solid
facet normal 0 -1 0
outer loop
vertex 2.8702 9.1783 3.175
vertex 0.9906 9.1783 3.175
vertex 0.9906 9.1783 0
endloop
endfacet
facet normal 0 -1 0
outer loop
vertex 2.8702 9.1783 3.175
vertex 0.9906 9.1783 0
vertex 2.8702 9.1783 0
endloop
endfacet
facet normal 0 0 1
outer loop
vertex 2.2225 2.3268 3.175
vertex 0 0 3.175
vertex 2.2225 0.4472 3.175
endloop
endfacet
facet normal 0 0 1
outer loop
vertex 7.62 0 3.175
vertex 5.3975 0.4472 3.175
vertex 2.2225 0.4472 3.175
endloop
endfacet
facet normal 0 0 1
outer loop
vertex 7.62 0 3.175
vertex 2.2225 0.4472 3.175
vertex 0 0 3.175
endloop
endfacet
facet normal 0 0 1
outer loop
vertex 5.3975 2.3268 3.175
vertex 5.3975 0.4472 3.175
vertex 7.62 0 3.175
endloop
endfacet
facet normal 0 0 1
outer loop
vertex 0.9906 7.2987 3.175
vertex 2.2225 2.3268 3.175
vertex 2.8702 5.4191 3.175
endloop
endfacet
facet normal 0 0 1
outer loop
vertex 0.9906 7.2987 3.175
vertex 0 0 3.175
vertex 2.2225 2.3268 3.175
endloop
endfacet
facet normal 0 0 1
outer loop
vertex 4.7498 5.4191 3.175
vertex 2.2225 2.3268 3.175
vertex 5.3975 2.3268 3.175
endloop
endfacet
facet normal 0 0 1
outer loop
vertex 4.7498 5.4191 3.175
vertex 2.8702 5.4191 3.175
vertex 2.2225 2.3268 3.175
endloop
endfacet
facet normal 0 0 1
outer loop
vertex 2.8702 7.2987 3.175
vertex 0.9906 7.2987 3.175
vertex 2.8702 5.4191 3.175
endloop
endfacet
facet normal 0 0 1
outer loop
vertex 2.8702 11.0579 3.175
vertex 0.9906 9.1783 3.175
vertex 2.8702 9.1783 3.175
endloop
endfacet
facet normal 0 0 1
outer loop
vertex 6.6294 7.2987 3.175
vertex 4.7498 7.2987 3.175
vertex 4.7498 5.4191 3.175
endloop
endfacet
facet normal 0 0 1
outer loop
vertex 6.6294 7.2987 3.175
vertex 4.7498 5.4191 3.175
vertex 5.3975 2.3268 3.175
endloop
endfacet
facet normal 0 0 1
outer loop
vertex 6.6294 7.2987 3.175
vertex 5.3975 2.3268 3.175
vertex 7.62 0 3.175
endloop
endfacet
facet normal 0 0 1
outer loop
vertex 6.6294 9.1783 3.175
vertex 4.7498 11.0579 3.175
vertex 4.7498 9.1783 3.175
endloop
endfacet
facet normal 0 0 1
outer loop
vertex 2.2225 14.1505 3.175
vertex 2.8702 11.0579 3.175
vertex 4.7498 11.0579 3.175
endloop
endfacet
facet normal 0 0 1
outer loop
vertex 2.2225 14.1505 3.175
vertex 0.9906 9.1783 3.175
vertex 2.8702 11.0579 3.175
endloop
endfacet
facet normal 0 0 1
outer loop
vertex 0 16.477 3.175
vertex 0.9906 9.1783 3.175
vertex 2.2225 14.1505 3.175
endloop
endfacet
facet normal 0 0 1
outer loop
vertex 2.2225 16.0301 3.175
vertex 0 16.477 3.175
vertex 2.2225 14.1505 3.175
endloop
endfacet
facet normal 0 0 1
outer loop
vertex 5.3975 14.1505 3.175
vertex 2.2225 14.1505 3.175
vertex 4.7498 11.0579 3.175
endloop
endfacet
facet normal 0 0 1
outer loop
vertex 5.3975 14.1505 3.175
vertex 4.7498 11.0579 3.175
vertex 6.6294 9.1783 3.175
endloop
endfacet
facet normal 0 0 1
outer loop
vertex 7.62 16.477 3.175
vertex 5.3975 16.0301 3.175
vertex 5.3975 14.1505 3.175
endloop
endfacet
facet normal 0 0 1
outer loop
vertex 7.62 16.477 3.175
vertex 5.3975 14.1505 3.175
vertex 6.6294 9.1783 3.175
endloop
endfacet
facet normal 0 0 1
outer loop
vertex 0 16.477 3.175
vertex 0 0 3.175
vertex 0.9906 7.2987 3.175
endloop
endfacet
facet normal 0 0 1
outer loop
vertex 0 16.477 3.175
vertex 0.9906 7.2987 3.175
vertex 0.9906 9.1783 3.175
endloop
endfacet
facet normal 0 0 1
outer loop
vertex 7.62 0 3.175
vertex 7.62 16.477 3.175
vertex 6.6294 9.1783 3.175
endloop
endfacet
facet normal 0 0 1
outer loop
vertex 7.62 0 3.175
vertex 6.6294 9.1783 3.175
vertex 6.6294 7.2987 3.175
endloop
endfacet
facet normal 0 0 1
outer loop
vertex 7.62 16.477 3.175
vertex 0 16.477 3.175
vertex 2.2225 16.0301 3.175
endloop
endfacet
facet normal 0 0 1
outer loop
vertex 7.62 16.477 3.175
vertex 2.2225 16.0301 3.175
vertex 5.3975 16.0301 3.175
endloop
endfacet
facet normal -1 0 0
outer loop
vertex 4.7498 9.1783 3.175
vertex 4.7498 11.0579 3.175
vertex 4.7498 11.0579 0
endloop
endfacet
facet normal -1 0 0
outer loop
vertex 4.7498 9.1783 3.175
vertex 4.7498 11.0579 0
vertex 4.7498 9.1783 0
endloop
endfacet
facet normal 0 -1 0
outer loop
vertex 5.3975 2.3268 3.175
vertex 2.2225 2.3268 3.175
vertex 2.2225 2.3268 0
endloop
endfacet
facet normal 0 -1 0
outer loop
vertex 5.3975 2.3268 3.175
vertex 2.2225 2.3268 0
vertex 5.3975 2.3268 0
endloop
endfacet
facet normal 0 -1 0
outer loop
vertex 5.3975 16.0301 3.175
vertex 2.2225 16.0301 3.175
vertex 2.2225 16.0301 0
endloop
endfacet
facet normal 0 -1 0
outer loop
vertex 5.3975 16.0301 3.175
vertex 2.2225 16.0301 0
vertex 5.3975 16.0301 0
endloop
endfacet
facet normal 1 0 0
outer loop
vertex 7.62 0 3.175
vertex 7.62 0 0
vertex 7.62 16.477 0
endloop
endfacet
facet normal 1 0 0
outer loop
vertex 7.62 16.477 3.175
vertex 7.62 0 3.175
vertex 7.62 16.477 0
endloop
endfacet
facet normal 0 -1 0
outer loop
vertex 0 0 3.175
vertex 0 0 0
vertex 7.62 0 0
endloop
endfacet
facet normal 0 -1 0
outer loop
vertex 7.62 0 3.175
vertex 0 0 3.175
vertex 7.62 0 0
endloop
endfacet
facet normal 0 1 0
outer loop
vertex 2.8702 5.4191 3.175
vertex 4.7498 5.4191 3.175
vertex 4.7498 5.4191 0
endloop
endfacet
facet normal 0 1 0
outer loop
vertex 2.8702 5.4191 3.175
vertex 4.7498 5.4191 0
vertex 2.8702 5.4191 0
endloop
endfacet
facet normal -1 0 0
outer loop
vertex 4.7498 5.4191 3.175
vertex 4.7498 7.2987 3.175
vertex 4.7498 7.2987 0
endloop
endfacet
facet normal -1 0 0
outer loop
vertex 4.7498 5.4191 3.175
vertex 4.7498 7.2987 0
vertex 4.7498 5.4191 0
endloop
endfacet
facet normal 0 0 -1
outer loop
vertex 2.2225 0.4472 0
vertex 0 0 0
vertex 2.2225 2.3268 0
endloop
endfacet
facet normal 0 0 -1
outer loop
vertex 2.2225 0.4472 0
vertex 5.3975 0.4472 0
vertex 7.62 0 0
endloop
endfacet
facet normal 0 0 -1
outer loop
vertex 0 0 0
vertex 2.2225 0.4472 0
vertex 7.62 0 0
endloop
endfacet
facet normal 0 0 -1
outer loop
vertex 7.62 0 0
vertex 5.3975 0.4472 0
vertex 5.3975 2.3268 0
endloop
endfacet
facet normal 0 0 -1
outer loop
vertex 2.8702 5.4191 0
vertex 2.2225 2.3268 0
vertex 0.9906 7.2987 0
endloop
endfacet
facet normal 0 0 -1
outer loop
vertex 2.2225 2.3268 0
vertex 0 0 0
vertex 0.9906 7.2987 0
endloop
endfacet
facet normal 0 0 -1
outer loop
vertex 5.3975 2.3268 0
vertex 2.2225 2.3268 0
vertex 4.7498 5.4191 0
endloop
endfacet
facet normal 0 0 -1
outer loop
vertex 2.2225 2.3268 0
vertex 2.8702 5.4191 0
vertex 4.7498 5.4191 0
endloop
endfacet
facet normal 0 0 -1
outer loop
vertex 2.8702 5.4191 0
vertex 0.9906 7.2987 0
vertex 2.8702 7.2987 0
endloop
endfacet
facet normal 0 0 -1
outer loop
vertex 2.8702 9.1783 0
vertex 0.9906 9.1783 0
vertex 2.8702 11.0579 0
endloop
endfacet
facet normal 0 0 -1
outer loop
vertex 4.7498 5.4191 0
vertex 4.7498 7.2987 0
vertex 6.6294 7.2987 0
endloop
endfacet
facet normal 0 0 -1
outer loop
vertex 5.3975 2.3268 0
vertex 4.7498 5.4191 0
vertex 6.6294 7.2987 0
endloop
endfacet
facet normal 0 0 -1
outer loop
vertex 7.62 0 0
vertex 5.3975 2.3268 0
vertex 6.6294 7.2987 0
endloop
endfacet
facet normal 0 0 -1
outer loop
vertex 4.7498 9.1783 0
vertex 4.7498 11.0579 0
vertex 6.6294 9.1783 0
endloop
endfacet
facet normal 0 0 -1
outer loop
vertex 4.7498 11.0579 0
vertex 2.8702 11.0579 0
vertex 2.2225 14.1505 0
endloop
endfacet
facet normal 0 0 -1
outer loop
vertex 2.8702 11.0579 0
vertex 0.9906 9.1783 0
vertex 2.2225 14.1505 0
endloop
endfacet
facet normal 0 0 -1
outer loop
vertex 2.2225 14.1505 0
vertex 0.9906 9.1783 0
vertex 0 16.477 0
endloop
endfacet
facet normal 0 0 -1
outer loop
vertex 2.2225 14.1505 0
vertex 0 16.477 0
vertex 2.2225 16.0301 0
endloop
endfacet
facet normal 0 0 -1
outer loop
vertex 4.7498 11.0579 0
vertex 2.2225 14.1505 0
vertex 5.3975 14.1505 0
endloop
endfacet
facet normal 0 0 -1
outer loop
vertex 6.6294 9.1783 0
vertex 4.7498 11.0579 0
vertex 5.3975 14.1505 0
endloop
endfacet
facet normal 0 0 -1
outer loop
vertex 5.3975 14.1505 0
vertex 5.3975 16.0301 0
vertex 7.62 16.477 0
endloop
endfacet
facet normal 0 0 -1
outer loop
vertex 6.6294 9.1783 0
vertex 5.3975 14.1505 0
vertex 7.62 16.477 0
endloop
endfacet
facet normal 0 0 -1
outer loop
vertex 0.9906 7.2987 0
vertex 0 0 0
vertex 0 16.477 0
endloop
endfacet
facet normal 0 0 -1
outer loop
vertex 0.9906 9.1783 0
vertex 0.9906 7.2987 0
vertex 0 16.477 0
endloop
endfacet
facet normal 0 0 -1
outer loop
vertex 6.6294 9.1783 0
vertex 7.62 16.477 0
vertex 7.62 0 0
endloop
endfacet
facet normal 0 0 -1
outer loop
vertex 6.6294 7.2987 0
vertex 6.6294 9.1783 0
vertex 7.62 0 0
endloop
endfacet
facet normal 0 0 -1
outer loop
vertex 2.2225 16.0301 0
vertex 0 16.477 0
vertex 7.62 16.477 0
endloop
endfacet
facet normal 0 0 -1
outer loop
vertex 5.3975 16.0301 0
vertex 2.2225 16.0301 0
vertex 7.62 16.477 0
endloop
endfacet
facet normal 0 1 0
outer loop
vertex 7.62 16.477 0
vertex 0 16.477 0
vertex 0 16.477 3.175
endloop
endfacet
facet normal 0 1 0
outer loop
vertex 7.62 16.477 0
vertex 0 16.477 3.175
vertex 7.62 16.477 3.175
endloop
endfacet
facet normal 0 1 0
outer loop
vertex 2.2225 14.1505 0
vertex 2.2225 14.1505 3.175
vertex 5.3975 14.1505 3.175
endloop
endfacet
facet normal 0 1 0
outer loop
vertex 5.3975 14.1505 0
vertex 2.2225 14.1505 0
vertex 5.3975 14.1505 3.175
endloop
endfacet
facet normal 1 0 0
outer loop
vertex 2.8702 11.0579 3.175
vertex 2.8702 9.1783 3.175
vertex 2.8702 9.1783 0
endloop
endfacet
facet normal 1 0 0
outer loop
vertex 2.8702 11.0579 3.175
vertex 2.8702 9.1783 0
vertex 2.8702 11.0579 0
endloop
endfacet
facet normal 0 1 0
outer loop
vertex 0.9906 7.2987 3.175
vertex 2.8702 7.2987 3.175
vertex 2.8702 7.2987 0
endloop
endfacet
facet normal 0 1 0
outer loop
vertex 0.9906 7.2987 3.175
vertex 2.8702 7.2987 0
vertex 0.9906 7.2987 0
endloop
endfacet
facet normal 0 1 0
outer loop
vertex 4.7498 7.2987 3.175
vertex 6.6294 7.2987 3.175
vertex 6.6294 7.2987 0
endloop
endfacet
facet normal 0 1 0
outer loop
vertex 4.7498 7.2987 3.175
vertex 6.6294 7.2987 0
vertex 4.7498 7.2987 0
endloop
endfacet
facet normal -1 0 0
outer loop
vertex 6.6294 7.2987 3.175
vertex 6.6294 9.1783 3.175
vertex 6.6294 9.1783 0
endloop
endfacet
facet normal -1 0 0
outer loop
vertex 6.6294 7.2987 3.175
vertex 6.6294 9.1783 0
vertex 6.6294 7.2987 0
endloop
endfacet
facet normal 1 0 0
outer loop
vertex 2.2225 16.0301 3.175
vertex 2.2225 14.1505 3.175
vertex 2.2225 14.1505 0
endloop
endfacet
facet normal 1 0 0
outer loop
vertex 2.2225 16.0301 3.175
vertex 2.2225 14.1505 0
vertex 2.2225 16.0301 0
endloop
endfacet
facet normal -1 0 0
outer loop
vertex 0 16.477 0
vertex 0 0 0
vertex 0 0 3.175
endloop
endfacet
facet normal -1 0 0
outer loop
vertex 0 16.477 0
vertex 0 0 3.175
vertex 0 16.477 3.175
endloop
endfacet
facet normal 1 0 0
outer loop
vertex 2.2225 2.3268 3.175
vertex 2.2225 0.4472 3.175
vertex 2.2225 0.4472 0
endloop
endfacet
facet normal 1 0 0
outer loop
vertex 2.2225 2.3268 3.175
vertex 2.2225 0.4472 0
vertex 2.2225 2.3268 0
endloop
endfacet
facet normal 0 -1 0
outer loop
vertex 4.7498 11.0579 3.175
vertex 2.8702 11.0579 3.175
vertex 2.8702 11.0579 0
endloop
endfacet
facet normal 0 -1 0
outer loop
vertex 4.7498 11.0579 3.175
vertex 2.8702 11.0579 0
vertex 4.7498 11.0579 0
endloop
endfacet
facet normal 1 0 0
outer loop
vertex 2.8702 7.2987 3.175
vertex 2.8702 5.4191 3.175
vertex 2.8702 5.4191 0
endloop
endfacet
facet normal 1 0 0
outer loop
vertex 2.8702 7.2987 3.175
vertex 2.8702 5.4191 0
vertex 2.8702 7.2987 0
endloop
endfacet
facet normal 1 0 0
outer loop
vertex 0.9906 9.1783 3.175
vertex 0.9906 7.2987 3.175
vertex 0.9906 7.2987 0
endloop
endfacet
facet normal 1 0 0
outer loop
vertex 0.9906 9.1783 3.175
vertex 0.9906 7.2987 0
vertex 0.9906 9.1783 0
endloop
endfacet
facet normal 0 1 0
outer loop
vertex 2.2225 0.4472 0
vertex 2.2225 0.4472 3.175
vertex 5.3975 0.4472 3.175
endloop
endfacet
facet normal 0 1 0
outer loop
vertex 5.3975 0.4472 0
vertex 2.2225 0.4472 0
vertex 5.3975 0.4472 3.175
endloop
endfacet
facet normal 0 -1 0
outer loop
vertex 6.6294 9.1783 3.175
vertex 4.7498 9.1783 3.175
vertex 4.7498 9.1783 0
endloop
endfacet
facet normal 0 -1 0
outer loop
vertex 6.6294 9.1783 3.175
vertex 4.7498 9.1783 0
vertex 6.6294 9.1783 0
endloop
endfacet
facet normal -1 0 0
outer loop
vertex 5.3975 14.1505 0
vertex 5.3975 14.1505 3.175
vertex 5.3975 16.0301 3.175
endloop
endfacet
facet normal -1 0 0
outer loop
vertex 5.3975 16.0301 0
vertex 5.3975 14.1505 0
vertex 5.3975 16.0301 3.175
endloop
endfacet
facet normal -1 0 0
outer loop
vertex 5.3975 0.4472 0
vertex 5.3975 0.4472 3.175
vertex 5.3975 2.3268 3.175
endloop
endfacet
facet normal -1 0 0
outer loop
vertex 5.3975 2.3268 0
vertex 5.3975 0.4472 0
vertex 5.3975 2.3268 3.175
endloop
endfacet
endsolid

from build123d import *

# Parameters (mm, degrees)
SKETCH1_W           = 7.62
SKETCH1_H           = 16.47698
BOSS_EXTRUDE1_DEPTH = 3.175
SKETCH2_W           = 3.175
SKETCH2_H           = 1.8796
CUT_EXTRUDE1_DEPTH  = 3.175


with BuildPart() as part:
    # Sketch1 → Boss-Extrude1 (new body)
    with BuildSketch(Plane.XY):
        with Locations((3.81, 8.23849)):
            Rectangle(SKETCH1_W, SKETCH1_H)
    extrude(amount=BOSS_EXTRUDE1_DEPTH)

    # Sketch2 → Cut-Extrude1 (cut)
    with BuildSketch(Plane.XY.offset(3.175)):
        Polygon((2.8702, 11.05789), (4.7498, 11.05789), (4.7498, 9.17829), (6.6294, 9.17829), (6.6294, 7.29869), (4.7498, 7.29869), (4.7498, 5.41909), (2.8702, 5.41909), (2.8702, 7.29869), (0.9906, 7.29869), (0.9906, 9.17829), (2.8702, 9.17829), align=None)
        with Locations((3.81, 15.090268823)):
            Rectangle(SKETCH2_W, SKETCH2_H)
        with Locations((3.81, 1.386968823)):
            Rectangle(SKETCH2_W, SKETCH2_H)
    extrude(amount=-CUT_EXTRUDE1_DEPTH, mode=Mode.SUBTRACT)


solid = part.part
